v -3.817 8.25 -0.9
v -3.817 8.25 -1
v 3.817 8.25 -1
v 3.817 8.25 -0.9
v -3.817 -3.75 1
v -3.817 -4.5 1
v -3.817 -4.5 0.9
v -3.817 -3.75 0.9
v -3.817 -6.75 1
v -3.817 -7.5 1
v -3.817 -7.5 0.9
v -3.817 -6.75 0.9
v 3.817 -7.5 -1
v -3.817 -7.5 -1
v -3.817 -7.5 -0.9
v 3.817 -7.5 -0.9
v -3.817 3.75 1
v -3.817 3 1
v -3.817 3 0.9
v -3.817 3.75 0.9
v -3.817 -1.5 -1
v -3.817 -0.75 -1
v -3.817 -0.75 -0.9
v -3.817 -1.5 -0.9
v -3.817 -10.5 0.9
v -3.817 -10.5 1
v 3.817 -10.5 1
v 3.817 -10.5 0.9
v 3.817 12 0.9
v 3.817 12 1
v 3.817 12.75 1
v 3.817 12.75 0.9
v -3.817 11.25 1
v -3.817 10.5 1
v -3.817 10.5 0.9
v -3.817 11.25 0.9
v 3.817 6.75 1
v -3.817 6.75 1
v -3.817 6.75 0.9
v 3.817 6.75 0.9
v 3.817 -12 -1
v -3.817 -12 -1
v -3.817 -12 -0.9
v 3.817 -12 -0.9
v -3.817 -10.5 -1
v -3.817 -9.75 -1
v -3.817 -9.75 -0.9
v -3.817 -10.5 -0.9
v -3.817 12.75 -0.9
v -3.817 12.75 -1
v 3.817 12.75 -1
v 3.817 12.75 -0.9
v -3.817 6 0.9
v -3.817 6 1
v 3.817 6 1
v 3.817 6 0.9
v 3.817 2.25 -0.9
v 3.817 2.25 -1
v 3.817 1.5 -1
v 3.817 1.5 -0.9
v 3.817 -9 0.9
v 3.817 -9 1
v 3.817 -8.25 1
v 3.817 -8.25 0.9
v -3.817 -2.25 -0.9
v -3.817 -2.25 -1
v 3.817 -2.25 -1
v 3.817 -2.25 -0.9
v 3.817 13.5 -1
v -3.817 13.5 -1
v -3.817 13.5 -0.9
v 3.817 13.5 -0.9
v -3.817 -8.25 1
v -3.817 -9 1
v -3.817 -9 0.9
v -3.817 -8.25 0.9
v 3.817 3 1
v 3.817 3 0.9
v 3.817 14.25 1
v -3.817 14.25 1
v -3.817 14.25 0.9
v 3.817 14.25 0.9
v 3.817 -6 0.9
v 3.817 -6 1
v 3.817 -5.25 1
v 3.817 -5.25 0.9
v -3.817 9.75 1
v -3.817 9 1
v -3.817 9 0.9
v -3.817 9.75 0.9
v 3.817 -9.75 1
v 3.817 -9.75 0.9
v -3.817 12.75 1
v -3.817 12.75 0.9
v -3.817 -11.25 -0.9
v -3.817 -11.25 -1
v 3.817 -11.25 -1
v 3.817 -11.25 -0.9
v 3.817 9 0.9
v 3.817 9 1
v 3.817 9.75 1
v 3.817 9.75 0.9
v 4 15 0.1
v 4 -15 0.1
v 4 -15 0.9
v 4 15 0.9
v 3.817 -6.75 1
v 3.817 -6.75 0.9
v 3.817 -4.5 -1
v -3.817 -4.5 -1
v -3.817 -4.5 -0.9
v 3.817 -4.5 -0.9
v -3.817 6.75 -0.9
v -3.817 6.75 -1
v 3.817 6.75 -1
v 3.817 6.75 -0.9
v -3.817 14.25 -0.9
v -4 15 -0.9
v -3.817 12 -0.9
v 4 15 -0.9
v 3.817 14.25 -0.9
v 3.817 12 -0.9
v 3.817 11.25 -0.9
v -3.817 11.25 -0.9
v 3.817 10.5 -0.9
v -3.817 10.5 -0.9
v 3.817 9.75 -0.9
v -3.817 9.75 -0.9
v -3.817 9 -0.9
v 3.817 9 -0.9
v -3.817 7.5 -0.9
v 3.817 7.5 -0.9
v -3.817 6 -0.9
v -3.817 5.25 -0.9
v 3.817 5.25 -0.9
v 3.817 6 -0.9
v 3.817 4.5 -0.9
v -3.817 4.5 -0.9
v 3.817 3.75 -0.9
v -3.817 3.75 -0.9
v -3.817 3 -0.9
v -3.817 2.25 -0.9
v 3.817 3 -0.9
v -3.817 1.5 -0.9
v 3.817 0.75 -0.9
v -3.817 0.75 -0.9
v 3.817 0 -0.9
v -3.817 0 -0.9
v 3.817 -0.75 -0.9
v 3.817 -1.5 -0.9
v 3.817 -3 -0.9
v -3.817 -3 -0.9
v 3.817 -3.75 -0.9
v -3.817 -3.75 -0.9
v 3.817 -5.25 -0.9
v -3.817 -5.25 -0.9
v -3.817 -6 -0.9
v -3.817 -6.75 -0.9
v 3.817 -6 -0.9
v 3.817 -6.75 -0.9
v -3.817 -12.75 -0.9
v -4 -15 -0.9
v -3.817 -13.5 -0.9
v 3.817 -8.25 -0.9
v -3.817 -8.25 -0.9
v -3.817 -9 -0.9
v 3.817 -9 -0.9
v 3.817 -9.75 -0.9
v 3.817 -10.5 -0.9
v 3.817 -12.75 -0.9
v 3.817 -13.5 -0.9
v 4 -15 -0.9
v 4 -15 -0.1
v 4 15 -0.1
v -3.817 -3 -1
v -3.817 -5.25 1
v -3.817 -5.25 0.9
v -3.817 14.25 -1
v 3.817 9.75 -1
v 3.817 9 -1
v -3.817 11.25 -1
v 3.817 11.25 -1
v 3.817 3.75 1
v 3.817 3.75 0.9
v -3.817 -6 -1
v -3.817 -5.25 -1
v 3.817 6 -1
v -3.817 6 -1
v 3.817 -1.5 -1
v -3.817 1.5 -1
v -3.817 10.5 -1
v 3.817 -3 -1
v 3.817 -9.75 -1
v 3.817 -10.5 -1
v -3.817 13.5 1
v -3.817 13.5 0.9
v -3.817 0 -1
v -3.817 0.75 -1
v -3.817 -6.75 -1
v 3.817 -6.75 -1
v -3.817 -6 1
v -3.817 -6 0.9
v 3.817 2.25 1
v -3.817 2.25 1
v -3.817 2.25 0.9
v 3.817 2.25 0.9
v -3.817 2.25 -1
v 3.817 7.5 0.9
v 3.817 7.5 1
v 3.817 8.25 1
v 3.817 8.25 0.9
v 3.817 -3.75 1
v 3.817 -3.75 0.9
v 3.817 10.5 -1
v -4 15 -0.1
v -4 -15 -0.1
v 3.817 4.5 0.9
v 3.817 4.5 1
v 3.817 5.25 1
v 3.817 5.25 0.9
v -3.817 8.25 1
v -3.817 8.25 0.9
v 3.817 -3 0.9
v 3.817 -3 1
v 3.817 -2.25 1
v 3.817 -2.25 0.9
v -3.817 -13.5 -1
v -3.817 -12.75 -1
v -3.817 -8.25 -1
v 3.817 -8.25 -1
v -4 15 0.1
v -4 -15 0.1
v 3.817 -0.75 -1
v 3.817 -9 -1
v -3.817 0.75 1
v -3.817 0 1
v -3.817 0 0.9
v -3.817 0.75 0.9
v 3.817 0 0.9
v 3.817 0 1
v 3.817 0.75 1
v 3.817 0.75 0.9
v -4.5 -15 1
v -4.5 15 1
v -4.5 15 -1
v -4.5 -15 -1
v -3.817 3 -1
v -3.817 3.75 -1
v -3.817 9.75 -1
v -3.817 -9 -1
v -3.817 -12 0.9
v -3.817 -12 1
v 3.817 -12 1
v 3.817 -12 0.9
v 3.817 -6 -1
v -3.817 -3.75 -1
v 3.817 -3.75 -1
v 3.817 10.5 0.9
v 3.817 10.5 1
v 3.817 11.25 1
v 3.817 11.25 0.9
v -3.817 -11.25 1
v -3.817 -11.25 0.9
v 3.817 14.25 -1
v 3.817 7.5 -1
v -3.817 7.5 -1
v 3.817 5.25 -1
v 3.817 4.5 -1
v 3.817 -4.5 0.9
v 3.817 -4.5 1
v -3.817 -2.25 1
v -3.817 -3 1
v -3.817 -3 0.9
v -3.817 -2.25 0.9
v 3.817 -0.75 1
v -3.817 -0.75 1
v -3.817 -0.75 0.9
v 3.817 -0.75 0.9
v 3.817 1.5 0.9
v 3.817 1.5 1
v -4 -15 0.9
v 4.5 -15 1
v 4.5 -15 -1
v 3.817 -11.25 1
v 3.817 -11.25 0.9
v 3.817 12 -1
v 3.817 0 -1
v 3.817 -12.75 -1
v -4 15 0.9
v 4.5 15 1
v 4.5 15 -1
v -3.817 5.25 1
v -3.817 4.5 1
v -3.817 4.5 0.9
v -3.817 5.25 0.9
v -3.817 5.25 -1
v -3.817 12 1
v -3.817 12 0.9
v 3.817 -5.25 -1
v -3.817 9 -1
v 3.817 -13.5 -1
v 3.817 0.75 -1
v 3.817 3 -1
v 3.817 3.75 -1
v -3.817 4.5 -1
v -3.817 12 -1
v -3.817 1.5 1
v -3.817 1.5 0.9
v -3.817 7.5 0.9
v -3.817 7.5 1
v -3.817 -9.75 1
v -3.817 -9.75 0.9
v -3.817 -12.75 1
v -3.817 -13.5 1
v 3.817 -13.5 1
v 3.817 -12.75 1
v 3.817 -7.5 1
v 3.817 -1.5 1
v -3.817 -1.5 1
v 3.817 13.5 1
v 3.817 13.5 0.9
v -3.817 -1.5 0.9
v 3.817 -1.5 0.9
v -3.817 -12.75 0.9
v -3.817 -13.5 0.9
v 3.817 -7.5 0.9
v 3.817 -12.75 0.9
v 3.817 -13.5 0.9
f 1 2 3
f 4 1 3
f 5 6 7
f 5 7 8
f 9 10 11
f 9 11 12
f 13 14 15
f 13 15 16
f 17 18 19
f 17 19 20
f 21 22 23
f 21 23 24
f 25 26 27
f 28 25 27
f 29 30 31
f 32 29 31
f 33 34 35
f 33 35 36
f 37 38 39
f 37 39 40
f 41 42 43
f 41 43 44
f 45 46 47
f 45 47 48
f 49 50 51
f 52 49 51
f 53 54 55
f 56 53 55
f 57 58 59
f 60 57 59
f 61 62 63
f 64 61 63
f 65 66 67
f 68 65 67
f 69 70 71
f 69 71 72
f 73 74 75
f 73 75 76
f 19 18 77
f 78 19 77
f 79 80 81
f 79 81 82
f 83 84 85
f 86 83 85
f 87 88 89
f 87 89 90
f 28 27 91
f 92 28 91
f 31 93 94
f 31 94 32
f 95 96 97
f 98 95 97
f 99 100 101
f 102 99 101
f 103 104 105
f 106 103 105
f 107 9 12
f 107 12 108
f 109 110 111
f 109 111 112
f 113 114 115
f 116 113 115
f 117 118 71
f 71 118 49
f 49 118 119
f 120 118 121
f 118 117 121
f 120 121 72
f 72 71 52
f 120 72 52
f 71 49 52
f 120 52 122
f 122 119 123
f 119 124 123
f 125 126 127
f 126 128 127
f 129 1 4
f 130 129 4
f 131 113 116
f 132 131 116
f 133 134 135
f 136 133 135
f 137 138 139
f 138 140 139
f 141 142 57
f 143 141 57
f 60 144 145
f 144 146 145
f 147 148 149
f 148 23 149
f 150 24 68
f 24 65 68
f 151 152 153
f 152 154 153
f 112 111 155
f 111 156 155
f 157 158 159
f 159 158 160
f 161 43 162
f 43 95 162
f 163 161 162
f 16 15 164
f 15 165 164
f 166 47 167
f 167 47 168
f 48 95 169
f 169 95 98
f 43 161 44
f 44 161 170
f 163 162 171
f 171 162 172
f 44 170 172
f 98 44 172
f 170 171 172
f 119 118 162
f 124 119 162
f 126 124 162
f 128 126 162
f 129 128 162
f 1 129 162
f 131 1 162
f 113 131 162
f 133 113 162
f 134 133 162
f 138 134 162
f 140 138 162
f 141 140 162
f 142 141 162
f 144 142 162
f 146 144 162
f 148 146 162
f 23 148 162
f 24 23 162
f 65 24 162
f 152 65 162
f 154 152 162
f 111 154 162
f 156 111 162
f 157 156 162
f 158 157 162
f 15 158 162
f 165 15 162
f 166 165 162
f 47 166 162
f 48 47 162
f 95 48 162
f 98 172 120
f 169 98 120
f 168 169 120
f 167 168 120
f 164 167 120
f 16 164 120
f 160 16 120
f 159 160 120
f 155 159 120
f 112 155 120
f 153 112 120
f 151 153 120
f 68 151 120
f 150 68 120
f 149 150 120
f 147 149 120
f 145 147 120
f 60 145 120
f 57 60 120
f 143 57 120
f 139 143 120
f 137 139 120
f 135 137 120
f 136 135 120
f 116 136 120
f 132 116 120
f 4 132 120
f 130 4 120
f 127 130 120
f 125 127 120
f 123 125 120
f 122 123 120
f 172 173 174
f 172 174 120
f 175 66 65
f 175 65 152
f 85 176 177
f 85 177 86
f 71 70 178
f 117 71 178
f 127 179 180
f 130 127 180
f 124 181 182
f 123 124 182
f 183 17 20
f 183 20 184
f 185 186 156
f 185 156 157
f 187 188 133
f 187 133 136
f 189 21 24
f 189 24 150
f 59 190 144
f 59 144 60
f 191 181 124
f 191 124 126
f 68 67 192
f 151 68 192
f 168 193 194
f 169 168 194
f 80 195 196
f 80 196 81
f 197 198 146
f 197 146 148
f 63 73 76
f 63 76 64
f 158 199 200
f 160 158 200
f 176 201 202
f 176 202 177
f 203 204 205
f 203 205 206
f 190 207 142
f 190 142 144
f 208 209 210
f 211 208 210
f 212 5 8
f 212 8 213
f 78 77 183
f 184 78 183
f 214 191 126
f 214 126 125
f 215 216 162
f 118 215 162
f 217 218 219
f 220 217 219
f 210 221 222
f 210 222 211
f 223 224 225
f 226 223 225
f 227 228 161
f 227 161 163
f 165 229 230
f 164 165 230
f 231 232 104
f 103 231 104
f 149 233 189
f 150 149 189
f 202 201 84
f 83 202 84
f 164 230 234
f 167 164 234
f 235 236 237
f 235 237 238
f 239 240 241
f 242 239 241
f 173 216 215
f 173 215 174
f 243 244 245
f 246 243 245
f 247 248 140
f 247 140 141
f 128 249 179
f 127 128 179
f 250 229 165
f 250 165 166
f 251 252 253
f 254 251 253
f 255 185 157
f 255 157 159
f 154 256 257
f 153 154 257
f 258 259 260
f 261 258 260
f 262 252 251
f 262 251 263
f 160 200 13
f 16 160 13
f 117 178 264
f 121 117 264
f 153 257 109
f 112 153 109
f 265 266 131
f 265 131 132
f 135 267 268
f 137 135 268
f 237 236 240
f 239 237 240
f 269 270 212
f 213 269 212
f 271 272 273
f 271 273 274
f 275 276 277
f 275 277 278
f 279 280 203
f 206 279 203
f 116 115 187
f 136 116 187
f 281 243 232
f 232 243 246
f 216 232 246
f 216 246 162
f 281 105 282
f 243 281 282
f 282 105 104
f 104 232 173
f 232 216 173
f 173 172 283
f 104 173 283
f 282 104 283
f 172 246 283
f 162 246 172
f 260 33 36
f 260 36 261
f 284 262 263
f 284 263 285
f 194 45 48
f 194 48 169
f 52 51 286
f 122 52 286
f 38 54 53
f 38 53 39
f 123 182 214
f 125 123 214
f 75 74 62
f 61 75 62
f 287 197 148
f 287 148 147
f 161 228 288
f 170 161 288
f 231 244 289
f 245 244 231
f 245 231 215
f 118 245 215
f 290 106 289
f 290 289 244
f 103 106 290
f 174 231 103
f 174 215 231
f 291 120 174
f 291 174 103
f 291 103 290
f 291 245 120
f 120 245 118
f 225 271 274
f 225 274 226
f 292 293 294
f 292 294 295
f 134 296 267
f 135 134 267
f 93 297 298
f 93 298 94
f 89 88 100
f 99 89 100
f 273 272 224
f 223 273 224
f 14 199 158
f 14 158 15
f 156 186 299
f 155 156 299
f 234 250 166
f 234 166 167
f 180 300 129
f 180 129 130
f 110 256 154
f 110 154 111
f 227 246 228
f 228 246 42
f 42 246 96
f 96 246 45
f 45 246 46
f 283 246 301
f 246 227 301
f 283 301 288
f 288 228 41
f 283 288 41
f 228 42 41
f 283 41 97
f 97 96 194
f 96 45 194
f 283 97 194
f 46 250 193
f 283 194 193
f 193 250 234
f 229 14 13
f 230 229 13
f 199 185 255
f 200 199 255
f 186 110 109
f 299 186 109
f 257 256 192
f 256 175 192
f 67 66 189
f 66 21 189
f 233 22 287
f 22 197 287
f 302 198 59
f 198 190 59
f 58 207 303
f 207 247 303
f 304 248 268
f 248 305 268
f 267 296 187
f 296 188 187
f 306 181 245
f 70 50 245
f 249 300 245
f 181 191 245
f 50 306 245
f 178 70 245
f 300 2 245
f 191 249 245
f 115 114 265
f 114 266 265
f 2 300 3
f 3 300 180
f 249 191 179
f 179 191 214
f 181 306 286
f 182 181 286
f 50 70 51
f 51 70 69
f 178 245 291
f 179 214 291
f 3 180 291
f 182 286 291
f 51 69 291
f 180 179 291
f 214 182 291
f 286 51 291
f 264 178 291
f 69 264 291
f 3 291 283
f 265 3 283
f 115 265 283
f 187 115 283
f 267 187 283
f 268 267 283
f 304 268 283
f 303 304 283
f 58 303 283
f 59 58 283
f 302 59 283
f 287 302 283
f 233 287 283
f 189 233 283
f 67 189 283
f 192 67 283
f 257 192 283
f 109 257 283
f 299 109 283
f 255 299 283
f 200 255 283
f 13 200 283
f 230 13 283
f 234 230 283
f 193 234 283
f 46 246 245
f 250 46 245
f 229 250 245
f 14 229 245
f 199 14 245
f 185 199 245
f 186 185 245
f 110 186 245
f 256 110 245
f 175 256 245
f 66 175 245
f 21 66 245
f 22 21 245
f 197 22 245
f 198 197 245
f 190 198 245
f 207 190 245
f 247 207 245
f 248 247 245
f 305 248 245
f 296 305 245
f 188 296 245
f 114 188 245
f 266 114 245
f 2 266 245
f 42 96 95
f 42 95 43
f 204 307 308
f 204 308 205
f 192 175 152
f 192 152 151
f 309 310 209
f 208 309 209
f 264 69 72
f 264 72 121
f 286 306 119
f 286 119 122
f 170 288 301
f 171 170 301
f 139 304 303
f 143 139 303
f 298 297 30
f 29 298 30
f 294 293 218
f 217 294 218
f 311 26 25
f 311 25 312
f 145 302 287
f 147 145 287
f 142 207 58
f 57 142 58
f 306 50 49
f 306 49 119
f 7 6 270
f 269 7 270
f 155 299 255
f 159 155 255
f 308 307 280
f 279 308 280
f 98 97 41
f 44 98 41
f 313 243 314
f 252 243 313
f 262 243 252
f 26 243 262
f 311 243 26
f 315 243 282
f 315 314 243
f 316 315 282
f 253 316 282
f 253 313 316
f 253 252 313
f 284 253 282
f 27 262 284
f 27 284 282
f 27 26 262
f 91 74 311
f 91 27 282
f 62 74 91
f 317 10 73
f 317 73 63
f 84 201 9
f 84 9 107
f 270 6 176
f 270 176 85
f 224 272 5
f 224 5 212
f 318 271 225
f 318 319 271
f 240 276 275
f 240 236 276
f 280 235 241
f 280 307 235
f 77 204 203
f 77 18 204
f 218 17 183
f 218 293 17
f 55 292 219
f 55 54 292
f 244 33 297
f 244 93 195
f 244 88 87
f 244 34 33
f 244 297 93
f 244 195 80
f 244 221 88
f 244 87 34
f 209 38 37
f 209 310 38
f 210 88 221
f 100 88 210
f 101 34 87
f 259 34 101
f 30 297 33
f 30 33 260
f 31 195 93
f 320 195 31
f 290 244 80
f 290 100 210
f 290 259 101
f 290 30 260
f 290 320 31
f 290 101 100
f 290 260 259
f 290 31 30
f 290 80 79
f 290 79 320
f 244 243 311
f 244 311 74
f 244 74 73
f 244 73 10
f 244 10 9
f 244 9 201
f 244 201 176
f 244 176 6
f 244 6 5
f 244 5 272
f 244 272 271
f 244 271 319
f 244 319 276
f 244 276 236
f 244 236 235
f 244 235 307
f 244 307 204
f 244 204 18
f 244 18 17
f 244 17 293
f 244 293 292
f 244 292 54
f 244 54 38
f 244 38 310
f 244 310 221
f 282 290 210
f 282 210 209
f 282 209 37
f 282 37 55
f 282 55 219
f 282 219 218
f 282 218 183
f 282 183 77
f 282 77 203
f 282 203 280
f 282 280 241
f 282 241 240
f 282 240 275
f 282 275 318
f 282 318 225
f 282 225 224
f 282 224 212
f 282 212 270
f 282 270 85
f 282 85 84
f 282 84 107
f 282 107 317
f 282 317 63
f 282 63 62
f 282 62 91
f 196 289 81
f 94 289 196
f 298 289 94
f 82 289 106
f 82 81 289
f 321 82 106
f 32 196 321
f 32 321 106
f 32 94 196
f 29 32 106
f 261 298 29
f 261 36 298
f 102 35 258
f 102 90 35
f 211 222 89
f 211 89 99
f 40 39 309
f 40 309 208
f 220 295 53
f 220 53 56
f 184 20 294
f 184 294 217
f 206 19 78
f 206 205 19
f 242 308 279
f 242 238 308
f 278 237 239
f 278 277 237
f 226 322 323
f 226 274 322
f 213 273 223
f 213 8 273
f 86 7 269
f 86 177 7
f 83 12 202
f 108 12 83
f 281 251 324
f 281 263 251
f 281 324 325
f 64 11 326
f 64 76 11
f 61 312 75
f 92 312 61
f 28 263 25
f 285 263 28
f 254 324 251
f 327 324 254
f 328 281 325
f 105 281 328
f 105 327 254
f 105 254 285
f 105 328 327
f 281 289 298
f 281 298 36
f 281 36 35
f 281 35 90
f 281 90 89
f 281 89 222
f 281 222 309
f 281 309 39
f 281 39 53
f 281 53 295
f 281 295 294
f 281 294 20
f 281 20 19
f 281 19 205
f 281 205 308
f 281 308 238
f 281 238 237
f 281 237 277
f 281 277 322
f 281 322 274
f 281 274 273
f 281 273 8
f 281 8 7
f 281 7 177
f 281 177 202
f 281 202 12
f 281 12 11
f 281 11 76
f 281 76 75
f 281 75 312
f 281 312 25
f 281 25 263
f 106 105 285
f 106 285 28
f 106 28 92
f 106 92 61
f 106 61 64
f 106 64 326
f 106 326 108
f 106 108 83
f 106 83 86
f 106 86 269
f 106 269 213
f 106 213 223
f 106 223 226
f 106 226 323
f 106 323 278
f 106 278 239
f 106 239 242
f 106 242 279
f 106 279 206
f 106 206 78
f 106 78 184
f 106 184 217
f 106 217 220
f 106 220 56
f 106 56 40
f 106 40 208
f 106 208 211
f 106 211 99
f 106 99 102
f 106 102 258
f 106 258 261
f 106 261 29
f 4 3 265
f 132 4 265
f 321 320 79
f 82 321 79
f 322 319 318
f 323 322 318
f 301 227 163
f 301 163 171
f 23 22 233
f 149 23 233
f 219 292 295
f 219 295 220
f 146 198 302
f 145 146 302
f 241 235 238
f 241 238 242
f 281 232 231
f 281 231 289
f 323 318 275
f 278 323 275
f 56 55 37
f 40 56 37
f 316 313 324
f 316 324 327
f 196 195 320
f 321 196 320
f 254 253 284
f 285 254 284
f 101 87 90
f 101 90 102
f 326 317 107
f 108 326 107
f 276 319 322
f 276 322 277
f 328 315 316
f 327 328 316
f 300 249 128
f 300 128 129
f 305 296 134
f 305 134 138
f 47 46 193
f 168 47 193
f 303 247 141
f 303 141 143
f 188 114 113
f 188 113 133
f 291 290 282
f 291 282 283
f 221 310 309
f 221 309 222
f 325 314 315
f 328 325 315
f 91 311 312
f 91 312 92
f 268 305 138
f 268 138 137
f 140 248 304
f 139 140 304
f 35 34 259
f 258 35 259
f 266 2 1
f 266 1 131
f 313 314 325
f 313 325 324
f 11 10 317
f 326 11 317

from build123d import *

# Parameters (mm, degrees)
SKETCH1_W                = 9
SKETCH1_H                = 2
BOSS_EXTRUDE1_DEPTH      = 15
CUT_EXTRUDE1_START       = -31
SKETCH2_W                = 8
SKETCH2_H                = 0.8
CUT_EXTRUDE1_DEPTH       = 32
SKETCH3_W                = 7.634272068
SKETCH3_H                = 0.75
CUT_EXTRUDE2_DEPTH       = 0.1
LPATTERN1_COUNT          = 19
LPATTERN1_PITCH          = 1.5
MIRROR2_COPY_1_SKETCH_W  = 7.634272068
MIRROR2_COPY_1_SKETCH_H  = 0.75
MIRROR2_COPY_1_DEPTH     = 0.1
MIRROR2_COPY_2_SKETCH_W  = 7.634272068
MIRROR2_COPY_2_SKETCH_H  = 0.75
MIRROR2_COPY_2_DEPTH     = 0.1
MIRROR2_COPY_3_SKETCH_W  = 7.634272068
MIRROR2_COPY_3_SKETCH_H  = 0.75
MIRROR2_COPY_3_DEPTH     = 0.1
MIRROR2_COPY_4_SKETCH_W  = 7.634272068
MIRROR2_COPY_4_SKETCH_H  = 0.75
MIRROR2_COPY_4_DEPTH     = 0.1
MIRROR2_COPY_5_SKETCH_W  = 7.634272068
MIRROR2_COPY_5_SKETCH_H  = 0.75
MIRROR2_COPY_5_DEPTH     = 0.1
MIRROR2_COPY_6_SKETCH_W  = 7.634272068
MIRROR2_COPY_6_SKETCH_H  = 0.75
MIRROR2_COPY_6_DEPTH     = 0.1
MIRROR2_COPY_7_SKETCH_W  = 7.634272068
MIRROR2_COPY_7_SKETCH_H  = 0.75
MIRROR2_COPY_7_DEPTH     = 0.1
MIRROR2_COPY_8_SKETCH_W  = 7.634272068
MIRROR2_COPY_8_SKETCH_H  = 0.75
MIRROR2_COPY_8_DEPTH     = 0.1
MIRROR2_COPY_9_SKETCH_W  = 7.634272068
MIRROR2_COPY_9_SKETCH_H  = 0.75
MIRROR2_COPY_9_DEPTH     = 0.1
MIRROR2_COPY_10_SKETCH_W = 7.634272068
MIRROR2_COPY_10_SKETCH_H = 0.75
MIRROR2_COPY_10_DEPTH    = 0.1
MIRROR2_COPY_11_SKETCH_W = 7.634272068
MIRROR2_COPY_11_SKETCH_H = 0.75
MIRROR2_COPY_11_DEPTH    = 0.1
MIRROR2_COPY_12_SKETCH_W = 7.634272068
MIRROR2_COPY_12_SKETCH_H = 0.75
MIRROR2_COPY_12_DEPTH    = 0.1
MIRROR2_COPY_13_SKETCH_W = 7.634272068
MIRROR2_COPY_13_SKETCH_H = 0.75
MIRROR2_COPY_13_DEPTH    = 0.1
MIRROR2_COPY_14_SKETCH_W = 7.634272068
MIRROR2_COPY_14_SKETCH_H = 0.75
MIRROR2_COPY_14_DEPTH    = 0.1
MIRROR2_COPY_15_SKETCH_W = 7.634272068
MIRROR2_COPY_15_SKETCH_H = 0.75
MIRROR2_COPY_15_DEPTH    = 0.1
MIRROR2_COPY_16_SKETCH_W = 7.634272068
MIRROR2_COPY_16_SKETCH_H = 0.75
MIRROR2_COPY_16_DEPTH    = 0.1
MIRROR2_COPY_17_SKETCH_W = 7.634272068
MIRROR2_COPY_17_SKETCH_H = 0.75
MIRROR2_COPY_17_DEPTH    = 0.1
MIRROR2_COPY_18_SKETCH_W = 7.634272068
MIRROR2_COPY_18_SKETCH_H = 0.75
MIRROR2_COPY_18_DEPTH    = 0.1


with BuildPart() as part:
    # Sketch1 → Boss-Extrude1 (new body, symmetric)
    with BuildSketch(Plane(origin=(0, 0, 0), x_dir=(1, 0, 0), z_dir=(0, 1, 0))):
        Rectangle(SKETCH1_W, SKETCH1_H)
    extrude(amount=BOSS_EXTRUDE1_DEPTH, both=True)

    # Sketch2 → Cut-Extrude1 (cut)
    with BuildSketch(Plane(origin=(0, 15, 0), x_dir=(1, 0, 0), z_dir=(0, 1, 0)).offset(CUT_EXTRUDE1_START)):
        with Locations((0, 0.5)):
            Rectangle(SKETCH2_W, SKETCH2_H)
    cut_extrude1 = extrude(amount=CUT_EXTRUDE1_DEPTH, mode=Mode.SUBTRACT)

    # Mirror1: Cut-Extrude1 across plane
    add(cut_extrude1.mirror(Plane.XY), mode=Mode.SUBTRACT)

    # Sketch3 → Cut-Extrude2 (cut)
    with BuildSketch(Plane.XY.offset(1)):
        with Locations((0, 13.875)):
            Rectangle(SKETCH3_W, SKETCH3_H)
    cut_extrude2 = extrude(amount=-CUT_EXTRUDE2_DEPTH, mode=Mode.SUBTRACT)

    # LPattern1: Cut-Extrude2 ×19
    with Locations(*[(0, -i * LPATTERN1_PITCH, 0) for i in range(1, LPATTERN1_COUNT)]):
        add(cut_extrude2, mode=Mode.SUBTRACT)

    # Mirror2: Cut-Extrude2 across plane
    add(cut_extrude2.mirror(Plane.XY), mode=Mode.SUBTRACT)

    # Mirror2 copy 1 sketch → Mirror2 copy 1 (cut)
    with BuildSketch(Plane(origin=(0, -1.5, -1), x_dir=(1, 0, 0), z_dir=(0, 0, -1))):
        with Locations((0, -13.875)):
            Rectangle(MIRROR2_COPY_1_SKETCH_W, MIRROR2_COPY_1_SKETCH_H)
    extrude(amount=-MIRROR2_COPY_1_DEPTH, mode=Mode.SUBTRACT)

    # Mirror2 copy 2 sketch → Mirror2 copy 2 (cut)
    with BuildSketch(Plane(origin=(0, -3, -1), x_dir=(1, 0, 0), z_dir=(0, 0, -1))):
        with Locations((0, -13.875)):
            Rectangle(MIRROR2_COPY_2_SKETCH_W, MIRROR2_COPY_2_SKETCH_H)
    extrude(amount=-MIRROR2_COPY_2_DEPTH, mode=Mode.SUBTRACT)

    # Mirror2 copy 3 sketch → Mirror2 copy 3 (cut)
    with BuildSketch(Plane(origin=(0, -4.5, -1), x_dir=(1, 0, 0), z_dir=(0, 0, -1))):
        with Locations((0, -13.875)):
            Rectangle(MIRROR2_COPY_3_SKETCH_W, MIRROR2_COPY_3_SKETCH_H)
    extrude(amount=-MIRROR2_COPY_3_DEPTH, mode=Mode.SUBTRACT)

    # Mirror2 copy 4 sketch → Mirror2 copy 4 (cut)
    with BuildSketch(Plane(origin=(0, -6, -1), x_dir=(1, 0, 0), z_dir=(0, 0, -1))):
        with Locations((0, -13.875)):
            Rectangle(MIRROR2_COPY_4_SKETCH_W, MIRROR2_COPY_4_SKETCH_H)
    extrude(amount=-MIRROR2_COPY_4_DEPTH, mode=Mode.SUBTRACT)

    # Mirror2 copy 5 sketch → Mirror2 copy 5 (cut)
    with BuildSketch(Plane(origin=(0, -7.5, -1), x_dir=(1, 0, 0), z_dir=(0, 0, -1))):
        with Locations((0, -13.875)):
            Rectangle(MIRROR2_COPY_5_SKETCH_W, MIRROR2_COPY_5_SKETCH_H)
    extrude(amount=-MIRROR2_COPY_5_DEPTH, mode=Mode.SUBTRACT)

    # Mirror2 copy 6 sketch → Mirror2 copy 6 (cut)
    with BuildSketch(Plane(origin=(0, -9, -1), x_dir=(1, 0, 0), z_dir=(0, 0, -1))):
        with Locations((0, -13.875)):
            Rectangle(MIRROR2_COPY_6_SKETCH_W, MIRROR2_COPY_6_SKETCH_H)
    extrude(amount=-MIRROR2_COPY_6_DEPTH, mode=Mode.SUBTRACT)

    # Mirror2 copy 7 sketch → Mirror2 copy 7 (cut)
    with BuildSketch(Plane(origin=(0, -10.5, -1), x_dir=(1, 0, 0), z_dir=(0, 0, -1))):
        with Locations((0, -13.875)):
            Rectangle(MIRROR2_COPY_7_SKETCH_W, MIRROR2_COPY_7_SKETCH_H)
    extrude(amount=-MIRROR2_COPY_7_DEPTH, mode=Mode.SUBTRACT)

    # Mirror2 copy 8 sketch → Mirror2 copy 8 (cut)
    with BuildSketch(Plane(origin=(0, -12, -1), x_dir=(1, 0, 0), z_dir=(0, 0, -1))):
        with Locations((0, -13.875)):
            Rectangle(MIRROR2_COPY_8_SKETCH_W, MIRROR2_COPY_8_SKETCH_H)
    extrude(amount=-MIRROR2_COPY_8_DEPTH, mode=Mode.SUBTRACT)

    # Mirror2 copy 9 sketch → Mirror2 copy 9 (cut)
    with BuildSketch(Plane(origin=(0, -13.5, -1), x_dir=(1, 0, 0), z_dir=(0, 0, -1))):
        with Locations((0, -13.875)):
            Rectangle(MIRROR2_COPY_9_SKETCH_W, MIRROR2_COPY_9_SKETCH_H)
    extrude(amount=-MIRROR2_COPY_9_DEPTH, mode=Mode.SUBTRACT)

    # Mirror2 copy 10 sketch → Mirror2 copy 10 (cut)
    with BuildSketch(Plane(origin=(0, -15, -1), x_dir=(1, 0, 0), z_dir=(0, 0, -1))):
        with Locations((0, -13.875)):
            Rectangle(MIRROR2_COPY_10_SKETCH_W, MIRROR2_COPY_10_SKETCH_H)
    extrude(amount=-MIRROR2_COPY_10_DEPTH, mode=Mode.SUBTRACT)

    # Mirror2 copy 11 sketch → Mirror2 copy 11 (cut)
    with BuildSketch(Plane(origin=(0, -16.5, -1), x_dir=(1, 0, 0), z_dir=(0, 0, -1))):
        with Locations((0, -13.875)):
            Rectangle(MIRROR2_COPY_11_SKETCH_W, MIRROR2_COPY_11_SKETCH_H)
    extrude(amount=-MIRROR2_COPY_11_DEPTH, mode=Mode.SUBTRACT)

    # Mirror2 copy 12 sketch → Mirror2 copy 12 (cut)
    with BuildSketch(Plane(origin=(0, -18, -1), x_dir=(1, 0, 0), z_dir=(0, 0, -1))):
        with Locations((0, -13.875)):
            Rectangle(MIRROR2_COPY_12_SKETCH_W, MIRROR2_COPY_12_SKETCH_H)
    extrude(amount=-MIRROR2_COPY_12_DEPTH, mode=Mode.SUBTRACT)

    # Mirror2 copy 13 sketch → Mirror2 copy 13 (cut)
    with BuildSketch(Plane(origin=(0, -19.5, -1), x_dir=(1, 0, 0), z_dir=(0, 0, -1))):
        with Locations((0, -13.875)):
            Rectangle(MIRROR2_COPY_13_SKETCH_W, MIRROR2_COPY_13_SKETCH_H)
    extrude(amount=-MIRROR2_COPY_13_DEPTH, mode=Mode.SUBTRACT)

    # Mirror2 copy 14 sketch → Mirror2 copy 14 (cut)
    with BuildSketch(Plane(origin=(0, -21, -1), x_dir=(1, 0, 0), z_dir=(0, 0, -1))):
        with Locations((0, -13.875)):
            Rectangle(MIRROR2_COPY_14_SKETCH_W, MIRROR2_COPY_14_SKETCH_H)
    extrude(amount=-MIRROR2_COPY_14_DEPTH, mode=Mode.SUBTRACT)

    # Mirror2 copy 15 sketch → Mirror2 copy 15 (cut)
    with BuildSketch(Plane(origin=(0, -22.5, -1), x_dir=(1, 0, 0), z_dir=(0, 0, -1))):
        with Locations((0, -13.875)):
            Rectangle(MIRROR2_COPY_15_SKETCH_W, MIRROR2_COPY_15_SKETCH_H)
    extrude(amount=-MIRROR2_COPY_15_DEPTH, mode=Mode.SUBTRACT)

    # Mirror2 copy 16 sketch → Mirror2 copy 16 (cut)
    with BuildSketch(Plane(origin=(0, -24, -1), x_dir=(1, 0, 0), z_dir=(0, 0, -1))):
        with Locations((0, -13.875)):
            Rectangle(MIRROR2_COPY_16_SKETCH_W, MIRROR2_COPY_16_SKETCH_H)
    extrude(amount=-MIRROR2_COPY_16_DEPTH, mode=Mode.SUBTRACT)

    # Mirror2 copy 17 sketch → Mirror2 copy 17 (cut)
    with BuildSketch(Plane(origin=(0, -25.5, -1), x_dir=(1, 0, 0), z_dir=(0, 0, -1))):
        with Locations((0, -13.875)):
            Rectangle(MIRROR2_COPY_17_SKETCH_W, MIRROR2_COPY_17_SKETCH_H)
    extrude(amount=-MIRROR2_COPY_17_DEPTH, mode=Mode.SUBTRACT)

    # Mirror2 copy 18 sketch → Mirror2 copy 18 (cut)
    with BuildSketch(Plane(origin=(0, -27, -1), x_dir=(1, 0, 0), z_dir=(0, 0, -1))):
        with Locations((0, -13.875)):
            Rectangle(MIRROR2_COPY_18_SKETCH_W, MIRROR2_COPY_18_SKETCH_H)
    extrude(amount=-MIRROR2_COPY_18_DEPTH, mode=Mode.SUBTRACT)


solid = part.part
